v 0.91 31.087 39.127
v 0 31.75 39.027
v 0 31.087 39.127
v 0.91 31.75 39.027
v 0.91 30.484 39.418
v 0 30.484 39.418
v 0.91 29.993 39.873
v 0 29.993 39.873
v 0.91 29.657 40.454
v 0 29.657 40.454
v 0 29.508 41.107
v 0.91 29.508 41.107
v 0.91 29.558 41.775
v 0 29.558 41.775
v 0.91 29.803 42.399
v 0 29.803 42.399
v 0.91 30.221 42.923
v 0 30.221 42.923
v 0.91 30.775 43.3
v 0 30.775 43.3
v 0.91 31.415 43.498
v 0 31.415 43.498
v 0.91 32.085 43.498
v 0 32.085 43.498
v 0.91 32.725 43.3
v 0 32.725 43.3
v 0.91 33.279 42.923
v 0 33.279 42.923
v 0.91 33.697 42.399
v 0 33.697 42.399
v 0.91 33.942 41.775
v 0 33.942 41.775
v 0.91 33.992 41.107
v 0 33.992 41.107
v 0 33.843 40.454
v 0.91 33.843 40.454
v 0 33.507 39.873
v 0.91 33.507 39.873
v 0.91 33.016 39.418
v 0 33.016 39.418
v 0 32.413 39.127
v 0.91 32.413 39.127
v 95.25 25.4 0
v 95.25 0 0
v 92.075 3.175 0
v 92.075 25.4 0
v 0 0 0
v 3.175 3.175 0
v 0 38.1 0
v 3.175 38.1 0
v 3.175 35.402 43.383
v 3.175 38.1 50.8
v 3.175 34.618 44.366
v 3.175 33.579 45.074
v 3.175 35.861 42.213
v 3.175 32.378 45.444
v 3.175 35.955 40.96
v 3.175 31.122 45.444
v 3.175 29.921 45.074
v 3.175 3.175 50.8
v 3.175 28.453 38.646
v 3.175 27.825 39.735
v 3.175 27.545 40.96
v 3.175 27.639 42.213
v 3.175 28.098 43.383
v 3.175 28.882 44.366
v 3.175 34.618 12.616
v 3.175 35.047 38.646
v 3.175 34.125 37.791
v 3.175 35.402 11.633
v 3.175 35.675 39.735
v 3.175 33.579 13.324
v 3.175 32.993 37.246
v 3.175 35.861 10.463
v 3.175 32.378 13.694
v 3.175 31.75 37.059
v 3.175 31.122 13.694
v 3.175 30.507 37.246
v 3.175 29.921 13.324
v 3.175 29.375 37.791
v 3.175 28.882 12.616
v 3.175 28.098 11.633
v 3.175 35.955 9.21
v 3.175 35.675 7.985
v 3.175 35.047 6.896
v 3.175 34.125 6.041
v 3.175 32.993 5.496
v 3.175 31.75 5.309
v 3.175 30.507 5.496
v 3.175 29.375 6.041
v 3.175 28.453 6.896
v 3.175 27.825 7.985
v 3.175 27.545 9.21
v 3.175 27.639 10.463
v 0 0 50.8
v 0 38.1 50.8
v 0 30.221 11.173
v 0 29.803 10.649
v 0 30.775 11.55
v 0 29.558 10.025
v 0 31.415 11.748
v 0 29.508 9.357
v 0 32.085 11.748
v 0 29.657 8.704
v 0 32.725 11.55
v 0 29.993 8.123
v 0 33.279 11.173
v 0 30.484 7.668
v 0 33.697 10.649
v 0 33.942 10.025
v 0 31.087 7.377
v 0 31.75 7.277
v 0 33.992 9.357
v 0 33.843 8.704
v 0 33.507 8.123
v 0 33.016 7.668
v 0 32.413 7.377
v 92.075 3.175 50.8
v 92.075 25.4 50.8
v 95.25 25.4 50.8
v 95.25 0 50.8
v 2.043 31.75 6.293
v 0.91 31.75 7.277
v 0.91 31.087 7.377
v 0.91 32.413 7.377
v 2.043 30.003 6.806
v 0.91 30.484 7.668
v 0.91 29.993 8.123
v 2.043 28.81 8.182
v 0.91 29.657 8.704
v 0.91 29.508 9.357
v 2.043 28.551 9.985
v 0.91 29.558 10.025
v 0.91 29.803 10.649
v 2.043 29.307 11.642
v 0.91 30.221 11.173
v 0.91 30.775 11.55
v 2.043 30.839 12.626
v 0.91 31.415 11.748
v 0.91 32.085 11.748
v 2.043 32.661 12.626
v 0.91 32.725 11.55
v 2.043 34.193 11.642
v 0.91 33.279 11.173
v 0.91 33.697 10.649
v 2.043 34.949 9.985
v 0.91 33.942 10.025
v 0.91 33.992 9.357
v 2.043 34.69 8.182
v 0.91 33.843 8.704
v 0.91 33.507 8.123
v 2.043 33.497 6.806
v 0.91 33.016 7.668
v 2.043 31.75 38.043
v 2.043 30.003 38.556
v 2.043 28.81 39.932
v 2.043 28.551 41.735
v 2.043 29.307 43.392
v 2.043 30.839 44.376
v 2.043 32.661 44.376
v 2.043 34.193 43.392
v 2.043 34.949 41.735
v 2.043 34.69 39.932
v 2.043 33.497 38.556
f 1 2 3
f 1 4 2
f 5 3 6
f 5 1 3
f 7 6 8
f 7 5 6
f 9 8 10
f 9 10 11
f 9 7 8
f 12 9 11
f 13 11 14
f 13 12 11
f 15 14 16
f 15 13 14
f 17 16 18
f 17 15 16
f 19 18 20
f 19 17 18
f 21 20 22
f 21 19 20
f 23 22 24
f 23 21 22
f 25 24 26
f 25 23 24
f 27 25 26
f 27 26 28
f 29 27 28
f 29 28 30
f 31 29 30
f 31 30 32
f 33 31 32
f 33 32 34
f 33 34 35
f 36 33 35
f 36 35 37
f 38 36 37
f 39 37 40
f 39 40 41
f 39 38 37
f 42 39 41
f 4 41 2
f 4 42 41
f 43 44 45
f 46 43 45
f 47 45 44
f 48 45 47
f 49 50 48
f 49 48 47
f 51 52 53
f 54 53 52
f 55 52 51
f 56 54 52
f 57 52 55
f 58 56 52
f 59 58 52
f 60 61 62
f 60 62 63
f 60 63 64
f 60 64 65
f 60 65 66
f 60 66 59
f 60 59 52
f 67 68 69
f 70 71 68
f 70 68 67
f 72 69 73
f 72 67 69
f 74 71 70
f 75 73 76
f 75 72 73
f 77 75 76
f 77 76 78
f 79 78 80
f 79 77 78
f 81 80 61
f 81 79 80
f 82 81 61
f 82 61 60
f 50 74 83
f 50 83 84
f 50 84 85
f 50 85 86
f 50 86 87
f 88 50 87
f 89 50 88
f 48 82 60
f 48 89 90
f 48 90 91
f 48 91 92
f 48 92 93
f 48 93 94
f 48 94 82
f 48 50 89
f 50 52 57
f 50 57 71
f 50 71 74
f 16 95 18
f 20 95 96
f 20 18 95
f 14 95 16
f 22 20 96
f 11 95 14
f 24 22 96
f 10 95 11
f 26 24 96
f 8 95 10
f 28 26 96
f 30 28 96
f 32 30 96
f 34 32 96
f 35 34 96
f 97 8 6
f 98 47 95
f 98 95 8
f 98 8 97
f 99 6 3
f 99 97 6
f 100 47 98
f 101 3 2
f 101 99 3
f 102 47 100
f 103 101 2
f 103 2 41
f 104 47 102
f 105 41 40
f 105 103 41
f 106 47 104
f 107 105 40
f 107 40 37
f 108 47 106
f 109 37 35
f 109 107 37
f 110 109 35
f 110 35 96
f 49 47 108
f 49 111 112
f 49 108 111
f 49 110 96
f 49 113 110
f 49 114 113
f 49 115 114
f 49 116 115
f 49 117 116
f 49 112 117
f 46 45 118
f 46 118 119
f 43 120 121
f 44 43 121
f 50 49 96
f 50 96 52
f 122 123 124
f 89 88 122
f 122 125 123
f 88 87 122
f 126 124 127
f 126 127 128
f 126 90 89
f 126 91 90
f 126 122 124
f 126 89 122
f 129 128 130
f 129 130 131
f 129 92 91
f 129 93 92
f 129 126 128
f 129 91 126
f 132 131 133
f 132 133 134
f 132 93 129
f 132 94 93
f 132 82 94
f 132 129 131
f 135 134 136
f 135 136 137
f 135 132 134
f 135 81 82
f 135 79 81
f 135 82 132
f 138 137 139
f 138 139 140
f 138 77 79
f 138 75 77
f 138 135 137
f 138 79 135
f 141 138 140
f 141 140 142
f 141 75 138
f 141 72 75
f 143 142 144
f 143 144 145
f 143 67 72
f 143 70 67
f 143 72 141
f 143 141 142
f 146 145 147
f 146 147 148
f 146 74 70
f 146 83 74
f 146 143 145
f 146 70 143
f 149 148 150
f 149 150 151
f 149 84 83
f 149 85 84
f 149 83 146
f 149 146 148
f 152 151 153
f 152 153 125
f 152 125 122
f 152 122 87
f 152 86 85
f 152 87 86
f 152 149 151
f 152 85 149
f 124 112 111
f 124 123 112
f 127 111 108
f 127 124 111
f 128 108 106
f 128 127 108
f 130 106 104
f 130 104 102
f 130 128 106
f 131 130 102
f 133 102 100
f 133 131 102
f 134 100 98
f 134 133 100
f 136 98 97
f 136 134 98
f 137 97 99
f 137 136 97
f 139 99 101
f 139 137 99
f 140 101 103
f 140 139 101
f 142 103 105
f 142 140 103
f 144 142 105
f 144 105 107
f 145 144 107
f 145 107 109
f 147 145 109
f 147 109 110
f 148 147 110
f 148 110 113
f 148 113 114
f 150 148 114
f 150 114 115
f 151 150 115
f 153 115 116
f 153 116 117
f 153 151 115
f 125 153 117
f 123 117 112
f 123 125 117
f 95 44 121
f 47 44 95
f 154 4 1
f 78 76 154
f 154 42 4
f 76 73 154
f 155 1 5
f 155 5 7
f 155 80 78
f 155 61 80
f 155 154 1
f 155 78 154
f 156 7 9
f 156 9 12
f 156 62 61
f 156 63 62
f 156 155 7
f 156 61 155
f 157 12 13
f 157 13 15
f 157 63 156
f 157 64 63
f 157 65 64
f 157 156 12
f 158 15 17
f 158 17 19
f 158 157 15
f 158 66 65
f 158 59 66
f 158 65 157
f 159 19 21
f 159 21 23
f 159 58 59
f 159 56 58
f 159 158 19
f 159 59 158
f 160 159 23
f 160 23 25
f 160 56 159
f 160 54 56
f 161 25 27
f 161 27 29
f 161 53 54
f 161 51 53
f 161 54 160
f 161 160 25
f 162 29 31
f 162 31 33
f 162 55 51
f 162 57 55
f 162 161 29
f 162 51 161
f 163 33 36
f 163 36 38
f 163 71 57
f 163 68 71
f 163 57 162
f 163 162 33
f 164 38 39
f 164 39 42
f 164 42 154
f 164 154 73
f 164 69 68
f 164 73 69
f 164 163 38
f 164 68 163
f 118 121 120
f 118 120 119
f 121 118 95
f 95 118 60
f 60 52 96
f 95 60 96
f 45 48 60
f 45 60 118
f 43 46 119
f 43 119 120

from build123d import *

# Parameters (mm, degrees)
BOSS_EXTRUDE1_DEPTH                           = 50.8
CSK_FOR_8_FLAT_HEAD_MACHINE_SCREW1_AT_2_COUNT = 2
CSK_FOR_8_FLAT_HEAD_MACHINE_SCREW1_AT_2_PITCH = 31.75


with BuildPart() as part:
    # Sketch1 → Boss-Extrude1 (new body)
    with BuildSketch(Plane.XY):
        Polygon((0, 0), (0, 38.1), (3.175, 38.1), (3.175, 3.175), (92.075, 3.175), (92.075, 25.4), (95.25, 25.4), (95.25, 0), align=None)
    extrude(amount=BOSS_EXTRUDE1_DEPTH)

    # Sketch3 → CSK for #8 Flat Head Machine Screw1 (revolve, cut)
    with BuildSketch(Plane(origin=(3.175, 31.75, 41.275), x_dir=(0, 0, -1), z_dir=(0, 1, 0))):
        Polygon((0, 0), (0, 3.175), (2.2479, 3.175), (2.2479, 2.26450021), (4.2164, 0), align=None)
    csk_for_8_flat_head_machine_screw1 = revolve(axis=Axis((9.525, 31.75, 41.275), (-1, 0, 0)), mode=Mode.SUBTRACT)

    # CSK for #8 Flat Head Machine Screw1 at 2: CSK for #8 Flat Head Machine Screw1 ×2
    with Locations(*[(0, 0, -i * CSK_FOR_8_FLAT_HEAD_MACHINE_SCREW1_AT_2_PITCH) for i in range(1, CSK_FOR_8_FLAT_HEAD_MACHINE_SCREW1_AT_2_COUNT)]):
        add(csk_for_8_flat_head_machine_screw1, mode=Mode.SUBTRACT)


solid = part.part
